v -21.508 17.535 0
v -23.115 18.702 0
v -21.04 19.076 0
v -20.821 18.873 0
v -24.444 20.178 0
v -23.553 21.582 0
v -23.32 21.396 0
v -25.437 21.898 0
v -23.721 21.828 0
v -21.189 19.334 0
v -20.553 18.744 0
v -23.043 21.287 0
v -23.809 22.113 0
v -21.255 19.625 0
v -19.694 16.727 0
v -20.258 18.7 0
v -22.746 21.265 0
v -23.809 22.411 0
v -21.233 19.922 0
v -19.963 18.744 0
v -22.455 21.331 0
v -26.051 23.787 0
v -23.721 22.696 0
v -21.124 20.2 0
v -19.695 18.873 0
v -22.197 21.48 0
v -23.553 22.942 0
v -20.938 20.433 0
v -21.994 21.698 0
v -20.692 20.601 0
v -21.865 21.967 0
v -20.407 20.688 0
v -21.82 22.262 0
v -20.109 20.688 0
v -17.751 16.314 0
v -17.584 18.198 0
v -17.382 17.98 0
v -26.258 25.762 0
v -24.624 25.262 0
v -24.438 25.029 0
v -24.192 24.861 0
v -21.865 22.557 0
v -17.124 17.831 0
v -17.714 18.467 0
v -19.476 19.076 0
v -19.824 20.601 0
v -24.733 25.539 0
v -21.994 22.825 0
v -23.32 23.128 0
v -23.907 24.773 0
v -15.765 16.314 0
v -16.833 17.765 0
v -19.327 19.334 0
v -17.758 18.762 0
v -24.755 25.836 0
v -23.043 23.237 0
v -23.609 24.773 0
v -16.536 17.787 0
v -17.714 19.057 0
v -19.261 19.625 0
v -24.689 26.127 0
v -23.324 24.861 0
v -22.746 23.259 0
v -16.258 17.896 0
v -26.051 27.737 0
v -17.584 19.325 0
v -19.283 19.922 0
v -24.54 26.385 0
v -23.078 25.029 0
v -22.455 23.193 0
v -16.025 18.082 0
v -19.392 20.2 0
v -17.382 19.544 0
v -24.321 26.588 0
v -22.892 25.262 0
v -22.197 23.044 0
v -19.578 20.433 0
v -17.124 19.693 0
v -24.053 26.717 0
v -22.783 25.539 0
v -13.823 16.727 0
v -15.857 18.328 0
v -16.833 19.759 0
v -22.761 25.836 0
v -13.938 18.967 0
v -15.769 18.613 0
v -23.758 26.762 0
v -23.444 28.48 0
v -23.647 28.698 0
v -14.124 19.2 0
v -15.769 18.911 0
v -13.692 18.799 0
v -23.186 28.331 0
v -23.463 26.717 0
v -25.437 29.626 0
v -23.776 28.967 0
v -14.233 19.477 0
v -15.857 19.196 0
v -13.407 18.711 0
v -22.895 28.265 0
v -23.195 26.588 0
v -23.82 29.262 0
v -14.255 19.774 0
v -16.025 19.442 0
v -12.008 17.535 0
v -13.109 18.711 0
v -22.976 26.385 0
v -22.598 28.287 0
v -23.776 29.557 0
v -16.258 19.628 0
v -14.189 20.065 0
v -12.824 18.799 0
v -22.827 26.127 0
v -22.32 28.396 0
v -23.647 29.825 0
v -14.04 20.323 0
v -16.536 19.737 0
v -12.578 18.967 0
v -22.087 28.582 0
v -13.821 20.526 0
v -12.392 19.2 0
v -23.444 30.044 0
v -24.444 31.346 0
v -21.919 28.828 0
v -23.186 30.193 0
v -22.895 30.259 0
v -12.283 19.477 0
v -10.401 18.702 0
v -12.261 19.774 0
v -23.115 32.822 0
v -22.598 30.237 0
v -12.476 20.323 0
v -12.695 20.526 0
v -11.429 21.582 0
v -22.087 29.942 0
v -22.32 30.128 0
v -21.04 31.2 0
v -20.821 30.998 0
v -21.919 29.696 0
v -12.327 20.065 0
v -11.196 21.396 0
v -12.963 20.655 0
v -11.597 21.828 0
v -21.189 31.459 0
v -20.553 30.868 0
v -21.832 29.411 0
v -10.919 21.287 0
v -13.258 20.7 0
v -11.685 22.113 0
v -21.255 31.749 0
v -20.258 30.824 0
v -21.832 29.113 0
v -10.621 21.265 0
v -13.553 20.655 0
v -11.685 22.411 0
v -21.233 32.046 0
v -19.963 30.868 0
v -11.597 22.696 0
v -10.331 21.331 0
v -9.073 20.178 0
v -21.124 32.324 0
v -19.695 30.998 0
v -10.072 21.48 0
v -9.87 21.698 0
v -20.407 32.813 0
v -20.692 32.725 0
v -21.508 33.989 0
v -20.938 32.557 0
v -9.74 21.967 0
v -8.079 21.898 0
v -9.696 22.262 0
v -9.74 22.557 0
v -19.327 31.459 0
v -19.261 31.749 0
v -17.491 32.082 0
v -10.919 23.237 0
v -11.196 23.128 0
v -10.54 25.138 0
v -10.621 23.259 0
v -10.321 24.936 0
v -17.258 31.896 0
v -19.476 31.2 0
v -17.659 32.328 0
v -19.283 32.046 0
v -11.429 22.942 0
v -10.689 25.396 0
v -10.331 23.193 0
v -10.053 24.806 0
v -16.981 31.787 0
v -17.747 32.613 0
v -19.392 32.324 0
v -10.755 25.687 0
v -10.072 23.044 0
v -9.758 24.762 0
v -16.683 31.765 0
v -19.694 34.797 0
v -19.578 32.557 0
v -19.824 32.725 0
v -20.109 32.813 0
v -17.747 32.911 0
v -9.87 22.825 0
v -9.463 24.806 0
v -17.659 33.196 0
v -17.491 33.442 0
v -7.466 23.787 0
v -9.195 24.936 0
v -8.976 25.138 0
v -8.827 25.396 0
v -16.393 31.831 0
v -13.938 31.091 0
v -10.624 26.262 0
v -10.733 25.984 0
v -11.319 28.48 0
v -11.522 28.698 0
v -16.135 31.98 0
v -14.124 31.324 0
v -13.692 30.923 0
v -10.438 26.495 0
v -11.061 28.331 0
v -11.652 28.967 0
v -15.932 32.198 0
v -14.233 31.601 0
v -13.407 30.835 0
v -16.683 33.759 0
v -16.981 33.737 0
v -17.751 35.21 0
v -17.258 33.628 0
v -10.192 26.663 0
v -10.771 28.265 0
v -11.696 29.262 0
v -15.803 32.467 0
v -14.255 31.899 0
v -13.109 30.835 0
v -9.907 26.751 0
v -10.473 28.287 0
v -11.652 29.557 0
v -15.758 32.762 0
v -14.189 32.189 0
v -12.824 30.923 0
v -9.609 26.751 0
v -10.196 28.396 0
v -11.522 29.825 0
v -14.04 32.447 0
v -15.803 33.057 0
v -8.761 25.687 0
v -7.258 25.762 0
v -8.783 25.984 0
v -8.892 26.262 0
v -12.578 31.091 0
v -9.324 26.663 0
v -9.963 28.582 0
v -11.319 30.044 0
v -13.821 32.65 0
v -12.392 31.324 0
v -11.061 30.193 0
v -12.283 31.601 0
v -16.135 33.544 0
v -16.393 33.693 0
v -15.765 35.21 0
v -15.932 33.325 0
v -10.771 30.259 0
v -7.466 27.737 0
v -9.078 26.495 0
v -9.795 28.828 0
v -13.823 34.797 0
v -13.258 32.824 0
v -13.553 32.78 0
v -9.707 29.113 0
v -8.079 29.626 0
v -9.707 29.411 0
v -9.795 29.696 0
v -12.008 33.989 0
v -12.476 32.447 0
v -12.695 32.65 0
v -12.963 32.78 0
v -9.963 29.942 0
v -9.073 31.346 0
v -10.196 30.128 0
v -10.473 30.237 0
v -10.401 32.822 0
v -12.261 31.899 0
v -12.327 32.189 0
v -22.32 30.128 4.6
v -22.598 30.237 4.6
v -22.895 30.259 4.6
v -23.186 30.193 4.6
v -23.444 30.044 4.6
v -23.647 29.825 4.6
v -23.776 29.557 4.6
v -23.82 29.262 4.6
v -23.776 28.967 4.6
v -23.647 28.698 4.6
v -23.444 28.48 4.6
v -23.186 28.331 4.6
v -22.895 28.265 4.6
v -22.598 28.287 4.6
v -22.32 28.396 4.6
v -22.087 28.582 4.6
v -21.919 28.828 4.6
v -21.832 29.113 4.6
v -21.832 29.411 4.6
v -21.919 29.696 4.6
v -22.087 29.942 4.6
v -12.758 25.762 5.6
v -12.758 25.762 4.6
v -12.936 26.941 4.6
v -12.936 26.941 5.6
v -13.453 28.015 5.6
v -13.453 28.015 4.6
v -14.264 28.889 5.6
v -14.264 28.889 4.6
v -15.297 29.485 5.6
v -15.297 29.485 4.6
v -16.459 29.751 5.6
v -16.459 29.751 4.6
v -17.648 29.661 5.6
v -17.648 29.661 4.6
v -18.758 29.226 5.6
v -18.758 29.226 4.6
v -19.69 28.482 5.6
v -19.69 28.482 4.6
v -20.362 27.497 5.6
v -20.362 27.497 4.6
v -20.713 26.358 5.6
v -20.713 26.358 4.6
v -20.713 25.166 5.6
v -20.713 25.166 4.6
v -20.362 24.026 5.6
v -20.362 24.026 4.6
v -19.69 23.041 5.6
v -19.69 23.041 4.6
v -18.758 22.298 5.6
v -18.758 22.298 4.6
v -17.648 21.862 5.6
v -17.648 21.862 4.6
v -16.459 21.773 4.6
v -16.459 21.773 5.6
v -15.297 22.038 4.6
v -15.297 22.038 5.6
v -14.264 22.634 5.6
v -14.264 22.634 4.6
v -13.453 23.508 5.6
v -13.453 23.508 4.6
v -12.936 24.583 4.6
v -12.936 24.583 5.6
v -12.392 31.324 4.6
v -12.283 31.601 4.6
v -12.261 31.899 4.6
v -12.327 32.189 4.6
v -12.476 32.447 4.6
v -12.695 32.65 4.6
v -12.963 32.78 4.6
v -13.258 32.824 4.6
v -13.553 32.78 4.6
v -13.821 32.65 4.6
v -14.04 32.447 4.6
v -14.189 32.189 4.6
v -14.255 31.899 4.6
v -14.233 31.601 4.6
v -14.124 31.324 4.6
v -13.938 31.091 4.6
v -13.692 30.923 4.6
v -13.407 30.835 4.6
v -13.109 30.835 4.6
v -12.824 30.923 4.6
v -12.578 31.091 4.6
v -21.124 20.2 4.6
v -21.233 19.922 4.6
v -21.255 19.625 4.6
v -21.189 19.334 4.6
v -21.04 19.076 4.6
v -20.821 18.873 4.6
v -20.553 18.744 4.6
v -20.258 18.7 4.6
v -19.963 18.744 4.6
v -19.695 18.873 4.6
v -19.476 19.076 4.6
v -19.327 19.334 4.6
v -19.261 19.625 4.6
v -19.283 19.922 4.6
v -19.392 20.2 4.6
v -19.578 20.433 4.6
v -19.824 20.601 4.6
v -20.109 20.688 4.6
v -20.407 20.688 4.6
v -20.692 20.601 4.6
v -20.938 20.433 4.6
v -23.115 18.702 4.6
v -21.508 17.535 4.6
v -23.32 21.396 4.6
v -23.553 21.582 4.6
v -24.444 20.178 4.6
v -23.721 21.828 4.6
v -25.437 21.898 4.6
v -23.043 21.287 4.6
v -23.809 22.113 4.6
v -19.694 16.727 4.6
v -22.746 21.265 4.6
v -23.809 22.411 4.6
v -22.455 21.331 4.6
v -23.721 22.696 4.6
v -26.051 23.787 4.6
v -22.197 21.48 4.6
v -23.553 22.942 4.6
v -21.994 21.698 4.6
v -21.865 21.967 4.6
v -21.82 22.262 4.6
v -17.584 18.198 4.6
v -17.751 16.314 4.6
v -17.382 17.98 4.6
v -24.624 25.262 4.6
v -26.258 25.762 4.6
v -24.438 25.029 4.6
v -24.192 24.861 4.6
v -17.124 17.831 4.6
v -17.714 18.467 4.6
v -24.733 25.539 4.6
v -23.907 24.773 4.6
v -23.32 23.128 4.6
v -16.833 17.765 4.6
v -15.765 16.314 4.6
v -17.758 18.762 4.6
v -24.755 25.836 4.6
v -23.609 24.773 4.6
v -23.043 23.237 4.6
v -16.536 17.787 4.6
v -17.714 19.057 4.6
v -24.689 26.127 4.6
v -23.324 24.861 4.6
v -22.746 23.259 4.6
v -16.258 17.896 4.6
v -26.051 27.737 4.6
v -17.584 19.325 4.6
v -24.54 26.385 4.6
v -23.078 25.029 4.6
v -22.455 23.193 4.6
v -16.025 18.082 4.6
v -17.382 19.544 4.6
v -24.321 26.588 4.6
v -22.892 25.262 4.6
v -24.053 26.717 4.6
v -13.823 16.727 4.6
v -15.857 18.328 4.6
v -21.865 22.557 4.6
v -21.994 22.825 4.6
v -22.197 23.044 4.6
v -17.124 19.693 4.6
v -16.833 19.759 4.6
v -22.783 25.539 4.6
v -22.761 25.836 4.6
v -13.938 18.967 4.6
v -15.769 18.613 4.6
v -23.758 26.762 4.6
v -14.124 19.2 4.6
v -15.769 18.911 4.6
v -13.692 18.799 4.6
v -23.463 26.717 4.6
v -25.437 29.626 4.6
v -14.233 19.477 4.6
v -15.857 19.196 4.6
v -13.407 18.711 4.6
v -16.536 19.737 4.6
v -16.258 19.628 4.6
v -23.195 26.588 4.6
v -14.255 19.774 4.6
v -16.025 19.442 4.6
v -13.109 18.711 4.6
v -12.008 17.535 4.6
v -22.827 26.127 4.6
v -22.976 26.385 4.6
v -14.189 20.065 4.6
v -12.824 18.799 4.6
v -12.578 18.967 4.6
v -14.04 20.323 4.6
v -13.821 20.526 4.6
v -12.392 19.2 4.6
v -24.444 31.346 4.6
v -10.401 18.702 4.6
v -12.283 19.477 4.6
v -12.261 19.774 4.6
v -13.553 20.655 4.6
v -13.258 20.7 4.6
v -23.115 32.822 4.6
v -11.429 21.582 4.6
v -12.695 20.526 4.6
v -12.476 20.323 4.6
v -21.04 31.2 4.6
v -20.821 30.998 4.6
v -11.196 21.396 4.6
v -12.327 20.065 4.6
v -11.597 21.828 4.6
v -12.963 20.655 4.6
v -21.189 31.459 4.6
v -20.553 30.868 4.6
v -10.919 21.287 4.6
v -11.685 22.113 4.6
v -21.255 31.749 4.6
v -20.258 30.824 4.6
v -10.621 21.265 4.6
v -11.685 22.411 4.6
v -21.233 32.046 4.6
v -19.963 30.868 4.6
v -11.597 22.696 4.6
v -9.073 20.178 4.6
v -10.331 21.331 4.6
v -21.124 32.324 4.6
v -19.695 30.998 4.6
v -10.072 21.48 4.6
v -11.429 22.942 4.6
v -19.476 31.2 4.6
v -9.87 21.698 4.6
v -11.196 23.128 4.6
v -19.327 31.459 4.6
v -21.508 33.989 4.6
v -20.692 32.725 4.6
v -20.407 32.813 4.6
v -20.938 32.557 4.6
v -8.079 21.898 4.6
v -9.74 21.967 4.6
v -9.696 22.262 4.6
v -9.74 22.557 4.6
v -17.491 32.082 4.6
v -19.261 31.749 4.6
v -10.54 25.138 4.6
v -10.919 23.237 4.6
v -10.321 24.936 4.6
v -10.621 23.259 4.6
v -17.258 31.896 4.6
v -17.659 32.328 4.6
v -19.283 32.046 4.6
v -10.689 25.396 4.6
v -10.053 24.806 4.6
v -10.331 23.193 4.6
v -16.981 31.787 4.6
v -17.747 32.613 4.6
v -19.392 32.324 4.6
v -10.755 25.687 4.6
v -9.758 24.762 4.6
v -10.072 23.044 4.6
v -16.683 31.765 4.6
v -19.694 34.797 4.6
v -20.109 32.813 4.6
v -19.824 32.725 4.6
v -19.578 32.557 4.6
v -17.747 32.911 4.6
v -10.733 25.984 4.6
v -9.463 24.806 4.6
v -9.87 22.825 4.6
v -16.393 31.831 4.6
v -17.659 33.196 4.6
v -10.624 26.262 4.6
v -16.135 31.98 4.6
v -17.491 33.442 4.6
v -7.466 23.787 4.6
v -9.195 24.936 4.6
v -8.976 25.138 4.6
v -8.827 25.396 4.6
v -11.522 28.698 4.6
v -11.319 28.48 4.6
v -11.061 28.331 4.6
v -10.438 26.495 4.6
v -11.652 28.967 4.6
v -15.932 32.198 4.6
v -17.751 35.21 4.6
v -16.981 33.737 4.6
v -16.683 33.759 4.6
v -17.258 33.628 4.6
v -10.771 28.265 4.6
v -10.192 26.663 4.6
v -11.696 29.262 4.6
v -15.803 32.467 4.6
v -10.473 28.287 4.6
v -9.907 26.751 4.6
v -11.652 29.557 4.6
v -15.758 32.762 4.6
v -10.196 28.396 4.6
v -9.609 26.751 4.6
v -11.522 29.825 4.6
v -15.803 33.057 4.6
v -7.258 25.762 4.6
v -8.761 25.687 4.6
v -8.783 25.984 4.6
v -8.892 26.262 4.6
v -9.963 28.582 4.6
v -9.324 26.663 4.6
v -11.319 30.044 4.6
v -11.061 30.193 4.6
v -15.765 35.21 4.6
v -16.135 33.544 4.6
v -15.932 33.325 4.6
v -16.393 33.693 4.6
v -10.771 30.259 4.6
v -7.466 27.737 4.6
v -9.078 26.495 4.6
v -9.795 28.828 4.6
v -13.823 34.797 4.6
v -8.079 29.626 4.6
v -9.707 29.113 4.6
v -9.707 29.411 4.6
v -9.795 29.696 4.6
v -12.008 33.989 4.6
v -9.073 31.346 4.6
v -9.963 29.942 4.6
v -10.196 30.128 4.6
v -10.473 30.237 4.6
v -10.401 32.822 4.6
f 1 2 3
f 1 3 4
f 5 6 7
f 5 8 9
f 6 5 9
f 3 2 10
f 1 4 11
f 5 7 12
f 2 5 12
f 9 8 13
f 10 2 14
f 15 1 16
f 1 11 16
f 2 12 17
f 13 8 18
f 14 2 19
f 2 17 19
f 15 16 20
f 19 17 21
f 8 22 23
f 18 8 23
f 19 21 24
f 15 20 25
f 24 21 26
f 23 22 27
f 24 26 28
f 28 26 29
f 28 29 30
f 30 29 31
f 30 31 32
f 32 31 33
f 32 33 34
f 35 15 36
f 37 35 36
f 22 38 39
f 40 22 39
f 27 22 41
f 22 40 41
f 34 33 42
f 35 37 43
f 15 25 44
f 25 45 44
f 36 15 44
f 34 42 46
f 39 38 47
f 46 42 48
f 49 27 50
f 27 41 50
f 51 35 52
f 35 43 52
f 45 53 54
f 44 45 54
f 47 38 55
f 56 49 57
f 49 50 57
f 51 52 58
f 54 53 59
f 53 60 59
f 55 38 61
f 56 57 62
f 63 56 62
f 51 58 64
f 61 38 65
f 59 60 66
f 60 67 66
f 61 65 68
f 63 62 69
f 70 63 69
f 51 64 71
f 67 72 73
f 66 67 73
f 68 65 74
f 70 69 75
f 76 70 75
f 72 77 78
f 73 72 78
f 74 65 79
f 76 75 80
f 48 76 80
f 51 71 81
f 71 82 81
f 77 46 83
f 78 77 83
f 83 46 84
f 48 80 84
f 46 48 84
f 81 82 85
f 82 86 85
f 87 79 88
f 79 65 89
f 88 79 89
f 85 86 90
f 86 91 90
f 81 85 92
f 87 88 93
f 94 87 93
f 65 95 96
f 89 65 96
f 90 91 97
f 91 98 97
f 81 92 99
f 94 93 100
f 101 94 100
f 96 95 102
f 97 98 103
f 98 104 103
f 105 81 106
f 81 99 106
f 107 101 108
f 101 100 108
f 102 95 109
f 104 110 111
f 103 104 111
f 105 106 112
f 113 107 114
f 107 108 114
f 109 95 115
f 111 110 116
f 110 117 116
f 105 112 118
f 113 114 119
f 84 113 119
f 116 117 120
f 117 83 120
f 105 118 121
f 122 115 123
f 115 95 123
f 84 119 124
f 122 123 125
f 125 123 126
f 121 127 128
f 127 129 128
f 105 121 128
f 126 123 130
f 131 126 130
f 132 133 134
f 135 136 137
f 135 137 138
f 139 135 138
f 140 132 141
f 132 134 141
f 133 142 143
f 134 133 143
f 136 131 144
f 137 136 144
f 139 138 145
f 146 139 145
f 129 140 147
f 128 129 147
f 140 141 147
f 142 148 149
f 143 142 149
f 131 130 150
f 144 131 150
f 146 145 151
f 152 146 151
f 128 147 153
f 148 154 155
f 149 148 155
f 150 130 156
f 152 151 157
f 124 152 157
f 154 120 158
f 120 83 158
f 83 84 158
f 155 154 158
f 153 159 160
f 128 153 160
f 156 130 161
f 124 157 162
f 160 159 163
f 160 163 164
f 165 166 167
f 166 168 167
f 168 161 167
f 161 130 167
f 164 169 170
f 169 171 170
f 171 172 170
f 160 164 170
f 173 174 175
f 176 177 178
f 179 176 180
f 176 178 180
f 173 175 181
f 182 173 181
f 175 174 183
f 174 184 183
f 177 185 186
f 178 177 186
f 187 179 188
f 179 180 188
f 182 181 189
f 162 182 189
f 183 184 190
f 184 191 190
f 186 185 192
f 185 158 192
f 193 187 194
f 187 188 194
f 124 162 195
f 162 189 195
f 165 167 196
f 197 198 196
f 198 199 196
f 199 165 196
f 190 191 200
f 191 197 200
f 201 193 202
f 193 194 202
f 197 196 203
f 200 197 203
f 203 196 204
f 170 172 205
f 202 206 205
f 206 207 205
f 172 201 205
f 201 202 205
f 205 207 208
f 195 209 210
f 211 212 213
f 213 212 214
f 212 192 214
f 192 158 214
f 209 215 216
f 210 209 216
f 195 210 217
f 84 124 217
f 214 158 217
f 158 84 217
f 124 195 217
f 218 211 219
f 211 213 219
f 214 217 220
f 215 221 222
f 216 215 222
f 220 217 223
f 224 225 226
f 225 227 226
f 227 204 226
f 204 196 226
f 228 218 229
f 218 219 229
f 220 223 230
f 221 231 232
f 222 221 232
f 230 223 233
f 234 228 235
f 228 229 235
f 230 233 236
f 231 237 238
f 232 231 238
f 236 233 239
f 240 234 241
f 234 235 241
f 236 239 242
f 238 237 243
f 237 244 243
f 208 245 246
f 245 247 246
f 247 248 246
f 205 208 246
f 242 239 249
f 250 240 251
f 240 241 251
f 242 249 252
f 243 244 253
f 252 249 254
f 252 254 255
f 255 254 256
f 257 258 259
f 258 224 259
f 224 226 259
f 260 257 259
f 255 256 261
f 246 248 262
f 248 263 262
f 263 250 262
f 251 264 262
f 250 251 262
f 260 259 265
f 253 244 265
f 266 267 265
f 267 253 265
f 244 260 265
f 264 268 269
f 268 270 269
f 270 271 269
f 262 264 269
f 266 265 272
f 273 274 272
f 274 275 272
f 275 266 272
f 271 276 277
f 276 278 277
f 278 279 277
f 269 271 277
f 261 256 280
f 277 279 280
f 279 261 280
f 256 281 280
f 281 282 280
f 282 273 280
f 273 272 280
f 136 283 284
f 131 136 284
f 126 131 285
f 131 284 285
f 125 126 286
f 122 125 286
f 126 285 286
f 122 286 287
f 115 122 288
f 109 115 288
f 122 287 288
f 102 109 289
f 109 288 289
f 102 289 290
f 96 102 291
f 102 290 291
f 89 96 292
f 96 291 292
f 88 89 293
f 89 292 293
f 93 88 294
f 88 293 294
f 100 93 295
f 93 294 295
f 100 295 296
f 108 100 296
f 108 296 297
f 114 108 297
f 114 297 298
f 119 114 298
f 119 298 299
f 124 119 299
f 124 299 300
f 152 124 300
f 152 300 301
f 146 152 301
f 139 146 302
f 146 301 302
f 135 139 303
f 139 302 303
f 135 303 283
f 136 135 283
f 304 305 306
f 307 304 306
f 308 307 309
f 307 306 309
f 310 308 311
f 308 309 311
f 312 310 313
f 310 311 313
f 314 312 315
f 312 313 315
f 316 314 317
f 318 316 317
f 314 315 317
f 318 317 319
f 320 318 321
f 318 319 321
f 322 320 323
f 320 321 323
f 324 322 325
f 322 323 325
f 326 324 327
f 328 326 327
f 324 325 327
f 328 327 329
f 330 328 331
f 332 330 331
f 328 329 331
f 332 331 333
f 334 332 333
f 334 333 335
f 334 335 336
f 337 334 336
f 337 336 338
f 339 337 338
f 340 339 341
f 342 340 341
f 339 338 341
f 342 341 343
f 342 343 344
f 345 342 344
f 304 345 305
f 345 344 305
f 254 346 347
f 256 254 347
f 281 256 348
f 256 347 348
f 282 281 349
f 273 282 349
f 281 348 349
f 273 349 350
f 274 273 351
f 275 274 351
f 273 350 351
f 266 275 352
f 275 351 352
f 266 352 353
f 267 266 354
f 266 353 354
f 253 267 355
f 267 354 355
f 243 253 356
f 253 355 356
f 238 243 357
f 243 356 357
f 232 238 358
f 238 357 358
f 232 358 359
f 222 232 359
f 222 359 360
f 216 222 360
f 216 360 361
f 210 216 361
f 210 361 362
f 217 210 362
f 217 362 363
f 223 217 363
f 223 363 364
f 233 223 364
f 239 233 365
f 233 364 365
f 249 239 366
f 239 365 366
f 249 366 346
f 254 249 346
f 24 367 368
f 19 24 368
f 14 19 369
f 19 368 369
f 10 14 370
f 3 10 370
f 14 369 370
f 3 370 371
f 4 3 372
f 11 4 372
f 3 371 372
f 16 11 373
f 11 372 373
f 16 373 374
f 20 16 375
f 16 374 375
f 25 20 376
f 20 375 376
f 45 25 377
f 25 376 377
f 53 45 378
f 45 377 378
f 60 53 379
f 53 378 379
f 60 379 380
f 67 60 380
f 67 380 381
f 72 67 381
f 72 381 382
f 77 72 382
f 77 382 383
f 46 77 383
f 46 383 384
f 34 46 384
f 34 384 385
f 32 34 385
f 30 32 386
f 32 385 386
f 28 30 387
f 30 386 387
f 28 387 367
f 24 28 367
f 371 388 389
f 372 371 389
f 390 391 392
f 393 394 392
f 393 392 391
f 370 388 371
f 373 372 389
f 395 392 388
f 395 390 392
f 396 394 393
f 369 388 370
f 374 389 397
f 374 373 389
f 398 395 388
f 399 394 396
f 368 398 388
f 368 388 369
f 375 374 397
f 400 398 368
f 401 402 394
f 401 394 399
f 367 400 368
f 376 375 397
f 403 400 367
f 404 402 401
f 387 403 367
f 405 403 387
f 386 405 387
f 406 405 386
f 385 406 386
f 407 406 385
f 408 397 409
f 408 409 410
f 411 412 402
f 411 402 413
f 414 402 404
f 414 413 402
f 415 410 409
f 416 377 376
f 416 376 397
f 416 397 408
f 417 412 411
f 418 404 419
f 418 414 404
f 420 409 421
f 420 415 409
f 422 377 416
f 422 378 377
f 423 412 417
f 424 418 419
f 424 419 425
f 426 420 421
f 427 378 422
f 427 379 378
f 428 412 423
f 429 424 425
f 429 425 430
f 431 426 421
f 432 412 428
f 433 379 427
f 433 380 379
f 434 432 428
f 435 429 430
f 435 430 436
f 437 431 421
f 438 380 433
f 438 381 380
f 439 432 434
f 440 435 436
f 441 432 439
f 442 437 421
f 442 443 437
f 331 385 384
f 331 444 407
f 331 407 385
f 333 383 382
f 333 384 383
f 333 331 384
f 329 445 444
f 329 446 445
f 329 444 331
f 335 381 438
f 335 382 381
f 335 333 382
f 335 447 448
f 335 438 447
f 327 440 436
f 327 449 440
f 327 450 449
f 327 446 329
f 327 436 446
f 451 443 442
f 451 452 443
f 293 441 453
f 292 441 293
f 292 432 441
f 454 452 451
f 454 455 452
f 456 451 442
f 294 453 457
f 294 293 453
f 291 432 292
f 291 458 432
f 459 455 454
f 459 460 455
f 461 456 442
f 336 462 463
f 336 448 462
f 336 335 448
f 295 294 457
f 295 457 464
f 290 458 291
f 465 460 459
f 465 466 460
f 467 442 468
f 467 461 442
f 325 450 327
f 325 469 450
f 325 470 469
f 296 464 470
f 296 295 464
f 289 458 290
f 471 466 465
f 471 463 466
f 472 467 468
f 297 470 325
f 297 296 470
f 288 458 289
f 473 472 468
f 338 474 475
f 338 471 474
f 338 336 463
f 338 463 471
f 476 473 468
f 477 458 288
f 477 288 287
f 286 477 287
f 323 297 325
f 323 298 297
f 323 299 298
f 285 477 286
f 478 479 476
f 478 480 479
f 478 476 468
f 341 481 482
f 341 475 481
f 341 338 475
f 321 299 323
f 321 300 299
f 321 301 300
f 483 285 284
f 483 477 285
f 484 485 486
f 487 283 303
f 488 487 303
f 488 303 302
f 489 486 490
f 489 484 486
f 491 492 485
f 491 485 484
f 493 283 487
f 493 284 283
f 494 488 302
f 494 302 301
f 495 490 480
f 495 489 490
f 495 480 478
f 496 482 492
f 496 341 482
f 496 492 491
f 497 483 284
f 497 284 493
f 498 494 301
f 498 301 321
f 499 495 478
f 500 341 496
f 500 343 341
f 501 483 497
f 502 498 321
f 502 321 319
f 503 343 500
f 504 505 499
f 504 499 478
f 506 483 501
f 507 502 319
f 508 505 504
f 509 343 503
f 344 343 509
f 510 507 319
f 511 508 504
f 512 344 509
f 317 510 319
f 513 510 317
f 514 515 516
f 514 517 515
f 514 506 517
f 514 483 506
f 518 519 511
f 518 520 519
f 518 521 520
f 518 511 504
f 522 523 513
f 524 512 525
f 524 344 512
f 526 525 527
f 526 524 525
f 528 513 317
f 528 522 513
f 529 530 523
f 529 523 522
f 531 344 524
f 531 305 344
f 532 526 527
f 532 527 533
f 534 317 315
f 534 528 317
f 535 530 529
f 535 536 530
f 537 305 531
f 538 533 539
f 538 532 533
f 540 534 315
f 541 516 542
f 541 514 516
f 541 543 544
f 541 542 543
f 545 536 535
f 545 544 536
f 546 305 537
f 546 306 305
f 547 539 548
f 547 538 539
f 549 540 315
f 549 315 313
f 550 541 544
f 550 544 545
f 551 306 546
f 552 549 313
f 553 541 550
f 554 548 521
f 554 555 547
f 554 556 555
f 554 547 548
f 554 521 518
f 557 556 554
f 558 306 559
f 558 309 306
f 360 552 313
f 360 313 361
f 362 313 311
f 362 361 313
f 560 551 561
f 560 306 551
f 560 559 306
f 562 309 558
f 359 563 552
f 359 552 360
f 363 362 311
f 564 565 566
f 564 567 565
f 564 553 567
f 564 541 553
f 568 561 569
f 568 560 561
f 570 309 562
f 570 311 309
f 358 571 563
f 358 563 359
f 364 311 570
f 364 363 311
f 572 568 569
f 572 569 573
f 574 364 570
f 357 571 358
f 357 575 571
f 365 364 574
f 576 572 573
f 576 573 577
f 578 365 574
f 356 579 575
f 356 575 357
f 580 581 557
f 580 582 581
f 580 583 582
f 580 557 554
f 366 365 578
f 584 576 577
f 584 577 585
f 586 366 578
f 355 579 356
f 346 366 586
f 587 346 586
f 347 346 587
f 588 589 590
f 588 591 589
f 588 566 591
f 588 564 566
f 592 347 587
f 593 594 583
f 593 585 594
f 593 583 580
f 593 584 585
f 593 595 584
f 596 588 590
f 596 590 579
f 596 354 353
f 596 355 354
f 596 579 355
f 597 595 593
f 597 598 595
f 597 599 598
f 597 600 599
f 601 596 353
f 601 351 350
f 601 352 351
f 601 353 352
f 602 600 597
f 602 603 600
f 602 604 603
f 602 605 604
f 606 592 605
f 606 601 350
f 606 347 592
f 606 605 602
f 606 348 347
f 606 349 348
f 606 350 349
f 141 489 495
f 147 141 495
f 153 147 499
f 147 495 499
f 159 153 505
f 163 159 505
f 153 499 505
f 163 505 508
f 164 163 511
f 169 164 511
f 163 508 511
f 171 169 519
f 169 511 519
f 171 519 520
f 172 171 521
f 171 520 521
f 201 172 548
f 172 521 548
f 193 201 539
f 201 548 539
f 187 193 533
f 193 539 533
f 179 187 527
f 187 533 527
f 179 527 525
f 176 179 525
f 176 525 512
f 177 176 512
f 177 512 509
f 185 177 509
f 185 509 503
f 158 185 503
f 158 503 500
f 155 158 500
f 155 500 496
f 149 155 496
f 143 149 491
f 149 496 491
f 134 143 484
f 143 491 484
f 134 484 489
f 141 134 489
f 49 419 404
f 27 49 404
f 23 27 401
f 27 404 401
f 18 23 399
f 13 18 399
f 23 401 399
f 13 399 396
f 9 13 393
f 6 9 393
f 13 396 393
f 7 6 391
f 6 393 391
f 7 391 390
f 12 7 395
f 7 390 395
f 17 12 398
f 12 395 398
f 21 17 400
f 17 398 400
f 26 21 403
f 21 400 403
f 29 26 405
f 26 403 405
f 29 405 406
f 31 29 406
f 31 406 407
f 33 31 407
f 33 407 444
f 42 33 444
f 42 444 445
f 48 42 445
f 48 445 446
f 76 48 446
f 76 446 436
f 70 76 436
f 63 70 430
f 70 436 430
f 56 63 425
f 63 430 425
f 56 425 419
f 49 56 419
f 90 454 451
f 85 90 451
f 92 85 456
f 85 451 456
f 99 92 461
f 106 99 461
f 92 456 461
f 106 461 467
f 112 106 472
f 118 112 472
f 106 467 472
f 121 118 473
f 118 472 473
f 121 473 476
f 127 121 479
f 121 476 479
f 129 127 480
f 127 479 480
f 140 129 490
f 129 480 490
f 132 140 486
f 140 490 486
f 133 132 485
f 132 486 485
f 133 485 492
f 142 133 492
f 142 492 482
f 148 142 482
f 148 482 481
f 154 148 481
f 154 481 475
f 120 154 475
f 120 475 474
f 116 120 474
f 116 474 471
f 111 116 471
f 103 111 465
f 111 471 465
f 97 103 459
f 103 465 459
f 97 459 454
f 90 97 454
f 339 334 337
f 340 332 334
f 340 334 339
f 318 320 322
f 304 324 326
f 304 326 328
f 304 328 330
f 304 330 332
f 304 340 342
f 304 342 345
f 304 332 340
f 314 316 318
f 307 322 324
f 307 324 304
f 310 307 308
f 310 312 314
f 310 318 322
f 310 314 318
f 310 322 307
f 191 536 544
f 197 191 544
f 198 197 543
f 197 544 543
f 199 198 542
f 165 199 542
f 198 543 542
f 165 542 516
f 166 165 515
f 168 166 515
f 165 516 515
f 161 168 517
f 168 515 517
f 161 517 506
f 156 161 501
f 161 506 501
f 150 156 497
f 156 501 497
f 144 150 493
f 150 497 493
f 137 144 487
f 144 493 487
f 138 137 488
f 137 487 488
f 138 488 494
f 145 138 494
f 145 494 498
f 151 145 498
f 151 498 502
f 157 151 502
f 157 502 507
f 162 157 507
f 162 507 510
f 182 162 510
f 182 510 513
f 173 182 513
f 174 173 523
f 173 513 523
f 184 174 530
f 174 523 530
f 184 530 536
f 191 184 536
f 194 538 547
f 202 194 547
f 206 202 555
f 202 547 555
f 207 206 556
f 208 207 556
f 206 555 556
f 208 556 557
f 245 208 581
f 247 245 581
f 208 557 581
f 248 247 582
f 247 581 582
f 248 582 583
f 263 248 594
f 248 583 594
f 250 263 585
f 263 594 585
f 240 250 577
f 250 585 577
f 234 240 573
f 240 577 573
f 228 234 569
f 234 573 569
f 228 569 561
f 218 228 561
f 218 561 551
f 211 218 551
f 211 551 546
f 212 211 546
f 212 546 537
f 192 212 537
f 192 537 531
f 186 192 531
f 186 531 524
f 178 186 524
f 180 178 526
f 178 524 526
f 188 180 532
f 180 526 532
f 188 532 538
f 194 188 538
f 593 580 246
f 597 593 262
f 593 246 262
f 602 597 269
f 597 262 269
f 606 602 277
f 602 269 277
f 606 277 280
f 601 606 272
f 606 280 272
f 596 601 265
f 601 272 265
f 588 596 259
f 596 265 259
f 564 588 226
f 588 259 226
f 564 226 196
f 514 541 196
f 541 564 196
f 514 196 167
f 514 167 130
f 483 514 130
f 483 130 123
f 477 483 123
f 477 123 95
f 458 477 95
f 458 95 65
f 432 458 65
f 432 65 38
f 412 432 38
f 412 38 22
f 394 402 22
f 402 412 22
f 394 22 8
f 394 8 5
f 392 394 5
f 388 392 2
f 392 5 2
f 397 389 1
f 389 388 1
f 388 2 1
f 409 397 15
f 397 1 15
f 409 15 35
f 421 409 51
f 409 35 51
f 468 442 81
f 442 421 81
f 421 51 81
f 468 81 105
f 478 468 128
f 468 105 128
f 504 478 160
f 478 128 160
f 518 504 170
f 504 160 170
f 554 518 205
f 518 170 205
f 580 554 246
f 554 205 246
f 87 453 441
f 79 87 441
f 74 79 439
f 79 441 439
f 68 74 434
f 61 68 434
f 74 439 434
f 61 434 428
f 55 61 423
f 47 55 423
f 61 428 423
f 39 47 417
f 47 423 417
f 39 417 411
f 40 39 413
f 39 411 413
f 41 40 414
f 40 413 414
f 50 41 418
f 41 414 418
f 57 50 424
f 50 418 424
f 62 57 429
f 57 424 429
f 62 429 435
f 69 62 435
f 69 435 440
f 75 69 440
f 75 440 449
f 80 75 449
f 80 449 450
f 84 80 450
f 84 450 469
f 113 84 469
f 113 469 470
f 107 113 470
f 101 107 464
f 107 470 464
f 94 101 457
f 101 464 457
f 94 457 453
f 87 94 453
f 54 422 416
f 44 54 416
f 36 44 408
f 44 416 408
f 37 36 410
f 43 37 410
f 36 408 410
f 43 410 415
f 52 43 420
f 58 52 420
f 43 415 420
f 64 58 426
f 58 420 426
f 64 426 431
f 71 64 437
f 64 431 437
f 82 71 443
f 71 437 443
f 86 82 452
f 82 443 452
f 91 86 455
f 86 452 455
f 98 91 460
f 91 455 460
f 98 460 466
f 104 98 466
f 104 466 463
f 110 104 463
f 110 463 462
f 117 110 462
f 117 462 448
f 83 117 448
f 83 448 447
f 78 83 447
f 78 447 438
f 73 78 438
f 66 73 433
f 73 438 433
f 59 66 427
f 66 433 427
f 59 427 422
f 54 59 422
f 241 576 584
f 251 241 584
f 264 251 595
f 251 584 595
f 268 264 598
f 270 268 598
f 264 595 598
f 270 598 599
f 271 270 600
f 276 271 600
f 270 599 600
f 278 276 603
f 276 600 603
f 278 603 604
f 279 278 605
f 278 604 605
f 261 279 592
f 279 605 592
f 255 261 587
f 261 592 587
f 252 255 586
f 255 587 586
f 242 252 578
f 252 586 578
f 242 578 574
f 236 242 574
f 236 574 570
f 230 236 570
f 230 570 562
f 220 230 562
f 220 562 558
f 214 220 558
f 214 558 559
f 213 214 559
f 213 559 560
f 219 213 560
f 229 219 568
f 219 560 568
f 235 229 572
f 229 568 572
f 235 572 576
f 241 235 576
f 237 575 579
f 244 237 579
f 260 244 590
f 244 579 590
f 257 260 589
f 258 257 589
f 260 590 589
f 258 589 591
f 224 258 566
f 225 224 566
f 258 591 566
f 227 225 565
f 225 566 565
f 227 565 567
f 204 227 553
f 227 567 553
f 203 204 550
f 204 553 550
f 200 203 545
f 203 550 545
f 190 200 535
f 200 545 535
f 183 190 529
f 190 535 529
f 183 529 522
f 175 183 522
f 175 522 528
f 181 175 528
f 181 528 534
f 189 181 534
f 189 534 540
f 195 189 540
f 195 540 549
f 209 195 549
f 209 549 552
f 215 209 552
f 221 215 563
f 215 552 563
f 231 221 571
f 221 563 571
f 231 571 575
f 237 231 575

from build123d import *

# Parameters (mm, degrees)
ESQUISSE1_R                  = 9.5
BOSS_EXTRU_1_DEPTH           = 4.6
R_P_TITION_CIRCULAIRE1_COUNT = 12
ESQUISSE2_R                  = 4
BOSS_EXTRU_4_DEPTH           = 1
ESQUISSE7_R                  = 1
ENL_V_MAT_EXTRU_1_DEPTH      = 4.6
R_P_TITION_CIRCULAIRE2_COUNT = 12


with BuildPart() as part:
    # Esquisse1 → Boss.-Extru.1 (new body)
    with BuildSketch(Plane.XY):
        with Locations((-16.758163119, 25.761769115)):
            Circle(ESQUISSE1_R)
    boss_extru_1 = extrude(amount=BOSS_EXTRU_1_DEPTH)


with BuildPart() as r_p_tition_circulaire1_1:
    # Répétition circulaire1: pattern copy
    add(boss_extru_1.rotate(Axis((-16.758163119, 25.761769115, 4.6), (0, 0, 1)), 1 * 360 / R_P_TITION_CIRCULAIRE1_COUNT))


with BuildPart() as r_p_tition_circulaire1_2:
    # Répétition circulaire1: pattern copy
    add(boss_extru_1.rotate(Axis((-16.758163119, 25.761769115, 4.6), (0, 0, 1)), 2 * 360 / R_P_TITION_CIRCULAIRE1_COUNT))


with BuildPart() as r_p_tition_circulaire1_3:
    # Répétition circulaire1: pattern copy
    add(boss_extru_1.rotate(Axis((-16.758163119, 25.761769115, 4.6), (0, 0, 1)), 3 * 360 / R_P_TITION_CIRCULAIRE1_COUNT))


with BuildPart() as r_p_tition_circulaire1_4:
    # Répétition circulaire1: pattern copy
    add(boss_extru_1.rotate(Axis((-16.758163119, 25.761769115, 4.6), (0, 0, 1)), 4 * 360 / R_P_TITION_CIRCULAIRE1_COUNT))


with BuildPart() as r_p_tition_circulaire1_5:
    # Répétition circulaire1: pattern copy
    add(boss_extru_1.rotate(Axis((-16.758163119, 25.761769115, 4.6), (0, 0, 1)), 5 * 360 / R_P_TITION_CIRCULAIRE1_COUNT))


with BuildPart() as r_p_tition_circulaire1_6:
    # Répétition circulaire1: pattern copy
    add(boss_extru_1.rotate(Axis((-16.758163119, 25.761769115, 4.6), (0, 0, 1)), 6 * 360 / R_P_TITION_CIRCULAIRE1_COUNT))


with BuildPart() as r_p_tition_circulaire1_7:
    # Répétition circulaire1: pattern copy
    add(boss_extru_1.rotate(Axis((-16.758163119, 25.761769115, 4.6), (0, 0, 1)), 7 * 360 / R_P_TITION_CIRCULAIRE1_COUNT))


with BuildPart() as r_p_tition_circulaire1_8:
    # Répétition circulaire1: pattern copy
    add(boss_extru_1.rotate(Axis((-16.758163119, 25.761769115, 4.6), (0, 0, 1)), 8 * 360 / R_P_TITION_CIRCULAIRE1_COUNT))


with BuildPart() as r_p_tition_circulaire1_9:
    # Répétition circulaire1: pattern copy
    add(boss_extru_1.rotate(Axis((-16.758163119, 25.761769115, 4.6), (0, 0, 1)), 9 * 360 / R_P_TITION_CIRCULAIRE1_COUNT))


with BuildPart() as r_p_tition_circulaire1_10:
    # Répétition circulaire1: pattern copy
    add(boss_extru_1.rotate(Axis((-16.758163119, 25.761769115, 4.6), (0, 0, 1)), 10 * 360 / R_P_TITION_CIRCULAIRE1_COUNT))


with BuildPart() as r_p_tition_circulaire1_11:
    # Répétition circulaire1: pattern copy
    add(boss_extru_1.rotate(Axis((-16.758163119, 25.761769115, 4.6), (0, 0, 1)), 11 * 360 / R_P_TITION_CIRCULAIRE1_COUNT))


with BuildPart() as part_1:
    add(part.part)

    # Répétition circulaire1 united with what: union Répétition circulaire1_1, Répétition circulaire1_2, Répétition circulaire1_3, Répétition circulaire1_4, Répétition circulaire1_5, Répétition circulaire1_6, Répétition circulaire1_7, Répétition circulaire1_8, Répétition circulaire1_9, Répétition circulaire1_10, Répétition circulaire1_11
    add(r_p_tition_circulaire1_1.part)
    add(r_p_tition_circulaire1_2.part)
    add(r_p_tition_circulaire1_3.part)
    add(r_p_tition_circulaire1_4.part)
    add(r_p_tition_circulaire1_5.part)
    add(r_p_tition_circulaire1_6.part)
    add(r_p_tition_circulaire1_7.part)
    add(r_p_tition_circulaire1_8.part)
    add(r_p_tition_circulaire1_9.part)
    add(r_p_tition_circulaire1_10.part)
    add(r_p_tition_circulaire1_11.part)

    # Esquisse2 → Boss.-Extru.4 (add)
    with BuildSketch(Plane.XY.offset(4.6)):
        with Locations((-16.758163119, 25.761769115)):
            Circle(ESQUISSE2_R)
    extrude(amount=BOSS_EXTRU_4_DEPTH)

    # Esquisse7 → Enlèv. mat.-Extru.1 (cut)
    with BuildSketch(Plane.XY.offset(4.6)):
        with Locations((-16.758163119, 32.761769115)):
            Circle(ESQUISSE7_R)
    enl_v_mat_extru_1 = extrude(amount=-ENL_V_MAT_EXTRU_1_DEPTH, mode=Mode.SUBTRACT)

    # Répétition circulaire2: Enlèv. mat.-Extru.1 ×12 about axis
    r_p_tition_circulaire2_axis = Axis((-16.758163119, 25.761769115, 0), (0, 0, 1))
    for i in range(1, R_P_TITION_CIRCULAIRE2_COUNT):
        add(enl_v_mat_extru_1.rotate(r_p_tition_circulaire2_axis, i * 360 / R_P_TITION_CIRCULAIRE2_COUNT), mode=Mode.SUBTRACT)


solid = part_1.part
